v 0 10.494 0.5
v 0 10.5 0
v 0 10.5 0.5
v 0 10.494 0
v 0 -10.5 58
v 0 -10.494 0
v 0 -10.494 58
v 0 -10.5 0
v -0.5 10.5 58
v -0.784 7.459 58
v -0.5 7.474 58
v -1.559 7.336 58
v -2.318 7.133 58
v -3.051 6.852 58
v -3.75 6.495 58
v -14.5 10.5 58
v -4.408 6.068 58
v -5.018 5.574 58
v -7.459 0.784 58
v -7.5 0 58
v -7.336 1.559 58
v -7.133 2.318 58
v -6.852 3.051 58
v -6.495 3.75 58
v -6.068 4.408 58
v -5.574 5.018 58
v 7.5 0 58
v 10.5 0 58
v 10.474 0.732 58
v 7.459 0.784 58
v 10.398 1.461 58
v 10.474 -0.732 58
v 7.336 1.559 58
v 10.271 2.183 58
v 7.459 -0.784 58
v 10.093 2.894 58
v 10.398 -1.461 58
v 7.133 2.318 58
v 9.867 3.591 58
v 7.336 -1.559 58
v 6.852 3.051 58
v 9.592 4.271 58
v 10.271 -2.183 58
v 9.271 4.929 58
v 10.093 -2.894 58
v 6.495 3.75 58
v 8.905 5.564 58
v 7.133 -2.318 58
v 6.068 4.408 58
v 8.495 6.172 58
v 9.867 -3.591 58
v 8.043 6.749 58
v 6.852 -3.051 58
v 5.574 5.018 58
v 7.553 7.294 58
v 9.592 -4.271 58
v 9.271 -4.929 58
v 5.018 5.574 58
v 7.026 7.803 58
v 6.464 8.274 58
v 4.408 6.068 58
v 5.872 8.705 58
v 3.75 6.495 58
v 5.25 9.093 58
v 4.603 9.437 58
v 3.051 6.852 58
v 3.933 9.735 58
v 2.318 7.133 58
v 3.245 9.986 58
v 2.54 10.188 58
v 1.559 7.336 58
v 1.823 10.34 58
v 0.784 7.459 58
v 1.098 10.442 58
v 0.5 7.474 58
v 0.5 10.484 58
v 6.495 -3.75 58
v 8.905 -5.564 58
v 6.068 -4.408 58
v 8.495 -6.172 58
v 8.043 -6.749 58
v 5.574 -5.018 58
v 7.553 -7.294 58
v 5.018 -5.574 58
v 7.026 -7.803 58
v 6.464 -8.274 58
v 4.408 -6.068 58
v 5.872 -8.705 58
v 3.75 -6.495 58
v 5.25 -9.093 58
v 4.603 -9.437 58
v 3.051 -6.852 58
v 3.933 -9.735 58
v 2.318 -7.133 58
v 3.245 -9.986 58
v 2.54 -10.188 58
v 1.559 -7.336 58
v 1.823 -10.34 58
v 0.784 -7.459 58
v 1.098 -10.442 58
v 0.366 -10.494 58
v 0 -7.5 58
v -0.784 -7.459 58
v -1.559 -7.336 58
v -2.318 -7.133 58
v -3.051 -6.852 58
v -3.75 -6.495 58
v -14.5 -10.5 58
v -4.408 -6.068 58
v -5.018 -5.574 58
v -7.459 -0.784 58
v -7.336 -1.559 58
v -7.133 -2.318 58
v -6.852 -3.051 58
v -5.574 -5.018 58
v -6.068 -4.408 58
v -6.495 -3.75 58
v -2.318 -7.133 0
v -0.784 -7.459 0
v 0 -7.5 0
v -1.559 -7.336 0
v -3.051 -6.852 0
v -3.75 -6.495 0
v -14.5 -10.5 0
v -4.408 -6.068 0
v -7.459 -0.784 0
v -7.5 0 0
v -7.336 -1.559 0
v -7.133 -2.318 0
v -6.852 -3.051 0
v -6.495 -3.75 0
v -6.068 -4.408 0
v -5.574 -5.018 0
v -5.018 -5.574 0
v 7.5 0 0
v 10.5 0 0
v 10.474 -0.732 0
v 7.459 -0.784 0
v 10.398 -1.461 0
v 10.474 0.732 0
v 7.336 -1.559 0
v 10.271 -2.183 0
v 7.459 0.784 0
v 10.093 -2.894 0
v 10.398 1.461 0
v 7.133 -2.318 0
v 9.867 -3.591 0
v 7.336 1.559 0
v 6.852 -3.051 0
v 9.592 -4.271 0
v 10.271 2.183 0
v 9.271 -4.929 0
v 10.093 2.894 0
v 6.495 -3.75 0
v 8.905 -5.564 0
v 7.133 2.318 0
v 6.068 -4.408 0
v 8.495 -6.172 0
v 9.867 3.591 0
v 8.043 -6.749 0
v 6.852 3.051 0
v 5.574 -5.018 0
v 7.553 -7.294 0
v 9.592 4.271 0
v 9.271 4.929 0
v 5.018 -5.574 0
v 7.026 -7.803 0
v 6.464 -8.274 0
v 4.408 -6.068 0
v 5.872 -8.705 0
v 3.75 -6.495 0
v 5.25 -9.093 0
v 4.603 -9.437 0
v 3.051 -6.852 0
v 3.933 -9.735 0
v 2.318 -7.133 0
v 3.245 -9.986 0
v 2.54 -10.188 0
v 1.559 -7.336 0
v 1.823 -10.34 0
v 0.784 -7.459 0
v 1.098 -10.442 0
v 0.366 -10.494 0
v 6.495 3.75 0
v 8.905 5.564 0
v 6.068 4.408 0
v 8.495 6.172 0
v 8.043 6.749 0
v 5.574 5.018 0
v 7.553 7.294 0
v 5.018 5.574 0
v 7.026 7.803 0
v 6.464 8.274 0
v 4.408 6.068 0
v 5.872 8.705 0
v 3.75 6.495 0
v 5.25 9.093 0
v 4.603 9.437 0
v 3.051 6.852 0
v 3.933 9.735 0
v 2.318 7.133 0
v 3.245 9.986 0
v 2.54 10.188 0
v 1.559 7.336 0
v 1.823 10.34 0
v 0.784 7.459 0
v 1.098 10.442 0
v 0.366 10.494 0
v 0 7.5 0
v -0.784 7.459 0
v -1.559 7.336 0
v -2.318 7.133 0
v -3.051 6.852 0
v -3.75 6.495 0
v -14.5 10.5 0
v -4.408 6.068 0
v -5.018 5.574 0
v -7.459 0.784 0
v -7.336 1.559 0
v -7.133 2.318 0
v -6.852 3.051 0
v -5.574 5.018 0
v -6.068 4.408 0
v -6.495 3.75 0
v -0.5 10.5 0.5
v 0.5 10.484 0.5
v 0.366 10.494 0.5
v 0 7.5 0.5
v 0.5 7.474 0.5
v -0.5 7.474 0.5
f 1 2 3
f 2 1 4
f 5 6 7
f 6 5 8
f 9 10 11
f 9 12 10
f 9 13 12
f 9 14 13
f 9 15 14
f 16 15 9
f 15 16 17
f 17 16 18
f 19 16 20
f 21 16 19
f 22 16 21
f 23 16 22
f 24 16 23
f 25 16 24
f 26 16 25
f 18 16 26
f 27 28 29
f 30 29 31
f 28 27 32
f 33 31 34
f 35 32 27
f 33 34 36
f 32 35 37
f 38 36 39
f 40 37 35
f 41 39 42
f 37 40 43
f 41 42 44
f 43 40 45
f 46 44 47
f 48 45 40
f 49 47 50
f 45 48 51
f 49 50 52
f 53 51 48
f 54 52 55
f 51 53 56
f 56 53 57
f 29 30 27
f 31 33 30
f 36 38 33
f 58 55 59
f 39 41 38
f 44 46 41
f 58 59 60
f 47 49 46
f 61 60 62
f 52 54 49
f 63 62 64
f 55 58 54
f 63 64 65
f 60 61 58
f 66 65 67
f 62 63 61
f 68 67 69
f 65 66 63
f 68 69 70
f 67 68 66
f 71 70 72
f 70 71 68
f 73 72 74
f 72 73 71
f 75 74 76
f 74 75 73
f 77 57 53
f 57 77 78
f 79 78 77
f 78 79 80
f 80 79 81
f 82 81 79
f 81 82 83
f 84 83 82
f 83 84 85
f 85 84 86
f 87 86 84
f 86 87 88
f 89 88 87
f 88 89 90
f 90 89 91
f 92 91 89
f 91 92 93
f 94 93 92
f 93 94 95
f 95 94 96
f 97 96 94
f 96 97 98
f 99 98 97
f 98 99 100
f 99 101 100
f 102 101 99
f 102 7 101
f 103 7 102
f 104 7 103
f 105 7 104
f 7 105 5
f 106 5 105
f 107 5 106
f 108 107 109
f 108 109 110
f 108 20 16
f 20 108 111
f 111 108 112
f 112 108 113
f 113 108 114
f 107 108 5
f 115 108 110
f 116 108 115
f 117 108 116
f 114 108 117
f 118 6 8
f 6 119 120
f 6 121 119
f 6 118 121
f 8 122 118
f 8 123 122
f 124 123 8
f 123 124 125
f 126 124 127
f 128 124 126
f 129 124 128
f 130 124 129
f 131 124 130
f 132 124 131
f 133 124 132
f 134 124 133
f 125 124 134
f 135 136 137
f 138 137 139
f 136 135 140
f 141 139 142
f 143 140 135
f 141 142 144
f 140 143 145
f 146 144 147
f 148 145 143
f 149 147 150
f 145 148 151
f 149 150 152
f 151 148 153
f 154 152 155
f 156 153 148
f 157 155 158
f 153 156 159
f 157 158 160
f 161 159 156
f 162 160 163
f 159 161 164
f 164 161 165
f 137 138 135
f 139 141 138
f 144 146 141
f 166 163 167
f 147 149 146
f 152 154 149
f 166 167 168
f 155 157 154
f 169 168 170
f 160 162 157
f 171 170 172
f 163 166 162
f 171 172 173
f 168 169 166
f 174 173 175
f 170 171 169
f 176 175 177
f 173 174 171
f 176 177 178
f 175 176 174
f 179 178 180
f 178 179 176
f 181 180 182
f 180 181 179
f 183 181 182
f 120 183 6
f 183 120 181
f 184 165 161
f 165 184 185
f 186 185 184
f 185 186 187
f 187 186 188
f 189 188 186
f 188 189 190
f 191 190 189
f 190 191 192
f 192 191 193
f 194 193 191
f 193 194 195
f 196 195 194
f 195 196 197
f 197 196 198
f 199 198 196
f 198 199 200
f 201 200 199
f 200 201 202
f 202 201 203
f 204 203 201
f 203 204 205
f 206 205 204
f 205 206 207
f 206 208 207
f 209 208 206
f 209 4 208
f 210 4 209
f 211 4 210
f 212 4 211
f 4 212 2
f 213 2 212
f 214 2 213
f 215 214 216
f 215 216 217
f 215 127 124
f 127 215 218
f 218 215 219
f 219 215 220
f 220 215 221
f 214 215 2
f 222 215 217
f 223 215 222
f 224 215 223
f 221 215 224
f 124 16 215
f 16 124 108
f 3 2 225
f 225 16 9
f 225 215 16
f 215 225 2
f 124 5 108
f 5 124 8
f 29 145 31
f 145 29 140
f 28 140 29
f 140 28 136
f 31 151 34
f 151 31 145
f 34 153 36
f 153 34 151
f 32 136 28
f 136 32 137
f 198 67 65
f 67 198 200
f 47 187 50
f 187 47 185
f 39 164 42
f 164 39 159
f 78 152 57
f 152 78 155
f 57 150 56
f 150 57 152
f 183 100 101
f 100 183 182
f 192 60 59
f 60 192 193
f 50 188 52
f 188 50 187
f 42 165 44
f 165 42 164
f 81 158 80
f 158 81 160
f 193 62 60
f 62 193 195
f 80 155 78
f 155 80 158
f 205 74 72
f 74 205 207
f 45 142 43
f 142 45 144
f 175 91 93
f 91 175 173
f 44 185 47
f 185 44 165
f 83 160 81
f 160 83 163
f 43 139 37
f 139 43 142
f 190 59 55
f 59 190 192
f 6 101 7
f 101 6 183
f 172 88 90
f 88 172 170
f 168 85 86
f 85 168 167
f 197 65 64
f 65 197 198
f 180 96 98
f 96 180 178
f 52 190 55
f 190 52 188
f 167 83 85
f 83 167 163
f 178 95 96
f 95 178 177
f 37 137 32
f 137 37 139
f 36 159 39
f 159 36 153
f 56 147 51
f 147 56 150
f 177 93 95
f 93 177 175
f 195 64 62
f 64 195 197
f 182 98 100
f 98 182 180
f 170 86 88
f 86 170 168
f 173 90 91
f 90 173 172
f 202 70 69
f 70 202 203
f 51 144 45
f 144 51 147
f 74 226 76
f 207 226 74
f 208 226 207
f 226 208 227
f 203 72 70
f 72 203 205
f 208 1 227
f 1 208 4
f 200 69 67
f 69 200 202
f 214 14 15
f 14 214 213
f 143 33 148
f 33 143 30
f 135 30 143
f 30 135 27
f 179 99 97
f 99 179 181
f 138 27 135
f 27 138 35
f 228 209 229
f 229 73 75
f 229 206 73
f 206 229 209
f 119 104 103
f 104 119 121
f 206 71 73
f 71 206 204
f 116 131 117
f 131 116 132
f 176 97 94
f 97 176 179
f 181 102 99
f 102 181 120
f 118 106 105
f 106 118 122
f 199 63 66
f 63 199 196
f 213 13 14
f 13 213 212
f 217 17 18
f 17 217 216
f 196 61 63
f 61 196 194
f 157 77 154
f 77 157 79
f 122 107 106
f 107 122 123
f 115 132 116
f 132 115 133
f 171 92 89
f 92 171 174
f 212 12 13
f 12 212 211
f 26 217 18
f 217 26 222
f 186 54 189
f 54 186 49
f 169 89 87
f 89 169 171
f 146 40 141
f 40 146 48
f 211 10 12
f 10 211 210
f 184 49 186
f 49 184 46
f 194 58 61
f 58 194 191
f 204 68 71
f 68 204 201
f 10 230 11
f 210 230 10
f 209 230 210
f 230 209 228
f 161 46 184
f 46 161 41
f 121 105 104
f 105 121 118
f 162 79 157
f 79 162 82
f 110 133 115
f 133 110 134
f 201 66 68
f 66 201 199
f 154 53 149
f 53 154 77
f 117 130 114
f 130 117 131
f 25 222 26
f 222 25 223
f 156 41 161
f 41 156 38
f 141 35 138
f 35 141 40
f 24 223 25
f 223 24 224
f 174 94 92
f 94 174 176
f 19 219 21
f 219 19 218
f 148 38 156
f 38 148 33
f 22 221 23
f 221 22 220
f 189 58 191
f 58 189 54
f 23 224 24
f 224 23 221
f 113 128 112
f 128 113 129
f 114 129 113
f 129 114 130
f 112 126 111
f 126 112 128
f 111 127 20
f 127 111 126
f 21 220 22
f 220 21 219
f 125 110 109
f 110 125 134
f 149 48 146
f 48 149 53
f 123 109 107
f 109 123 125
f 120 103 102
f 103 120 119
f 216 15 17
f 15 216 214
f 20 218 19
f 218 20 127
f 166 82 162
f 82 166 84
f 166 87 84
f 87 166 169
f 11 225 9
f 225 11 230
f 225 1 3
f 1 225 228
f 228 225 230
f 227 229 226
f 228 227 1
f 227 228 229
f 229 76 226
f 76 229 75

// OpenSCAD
// PRUSA iteration3
// Bearing holders
// GNU GPL v3
// Josef Průša <iam@josefprusa.cz> and contributors
// http://www.reprap.org/wiki/Prusa_Mendel
// http://prusamendel.org

bearing_diameter = 15;

module horizontal_bearing_base(bearings=1){
 translate(v=[0,0,6]) cube(size = [24,4+bearings*24,12], center = true);	
}
module horizontal_bearing_holes(bearings=1){
 cutter_lenght = 10+bearings*25;
 one_holder_lenght = 8+25;
 holder_lenght = 8+bearings*25;
 
 // Main bearing cut
 difference(){
  translate(v=[0,0,12+1.5]) rotate(a=[90,0,0]) translate(v=[0,0,-cutter_lenght/2]) cylinder(h = cutter_lenght, r=bearing_diameter/2, $fn=50);
  // Bearing retainers
  translate(v=[0,1.5-holder_lenght/2,3+1.5]) cube(size = [24,6,8], center = true);
  translate(v=[0,-1.5+holder_lenght/2,3+1.5]) cube(size = [24,6,8], center = true);
 }
 
 // Ziptie cutouts
 ziptie_cut_ofset = 0;
 for ( i = [0 : bearings-1] ){
  // For easier positioning I move them by half of one 
  // bearing holder then add each bearign lenght and then center again
  translate(v=[0,-holder_lenght/2,0]) translate(v=[0,one_holder_lenght/2+i*25,0]) difference(){
   union(){
    translate(v=[0,2-6,12]) rotate(a=[90,0,0]) translate(v=[0,0,0]) cylinder(h = 4, r=12.5, $fn=50);
    translate(v=[0,2+6,12]) rotate(a=[90,0,0]) translate(v=[0,0,0]) cylinder(h = 4, r=12.5, $fn=50);
   }
   translate(v=[0,10,12]) rotate(a=[90,0,0]) translate(v=[0,0,0]) cylinder(h = 24, r=10, $fn=50);
  }
 }
 
}

module horizontal_bearing_test(){
 difference(){
  horizontal_bearing_base(1);
  horizontal_bearing_holes(1);
 }
 translate(v=[30,0,0]) difference(){
  horizontal_bearing_base(2);
  horizontal_bearing_holes(2);
 }
 translate(v=[60,0,0]) difference(){
  horizontal_bearing_base(3);
  horizontal_bearing_holes(3);
 }
}



thinwall = 3;
bearing_size = bearing_diameter + 2 * thinwall;

module vertical_bearing_base(){
 translate(v=[-2-bearing_size/4,0,29]) cube(size = [4+bearing_size/2,bearing_size,58], center = true);
 cylinder(h = 58, r=bearing_size/2, $fn = 90);
}

module vertical_bearing_holes(){
  translate(v=[0,0,-1]) cylinder(h = 62, r=bearing_diameter/2, $fn = 60);
  rotate(a=[0,0,90]) translate(v=[8,0,31.5]) cube(size = [5,1,62], center = true);
}

difference(){
vertical_bearing_base();
vertical_bearing_holes();
}
